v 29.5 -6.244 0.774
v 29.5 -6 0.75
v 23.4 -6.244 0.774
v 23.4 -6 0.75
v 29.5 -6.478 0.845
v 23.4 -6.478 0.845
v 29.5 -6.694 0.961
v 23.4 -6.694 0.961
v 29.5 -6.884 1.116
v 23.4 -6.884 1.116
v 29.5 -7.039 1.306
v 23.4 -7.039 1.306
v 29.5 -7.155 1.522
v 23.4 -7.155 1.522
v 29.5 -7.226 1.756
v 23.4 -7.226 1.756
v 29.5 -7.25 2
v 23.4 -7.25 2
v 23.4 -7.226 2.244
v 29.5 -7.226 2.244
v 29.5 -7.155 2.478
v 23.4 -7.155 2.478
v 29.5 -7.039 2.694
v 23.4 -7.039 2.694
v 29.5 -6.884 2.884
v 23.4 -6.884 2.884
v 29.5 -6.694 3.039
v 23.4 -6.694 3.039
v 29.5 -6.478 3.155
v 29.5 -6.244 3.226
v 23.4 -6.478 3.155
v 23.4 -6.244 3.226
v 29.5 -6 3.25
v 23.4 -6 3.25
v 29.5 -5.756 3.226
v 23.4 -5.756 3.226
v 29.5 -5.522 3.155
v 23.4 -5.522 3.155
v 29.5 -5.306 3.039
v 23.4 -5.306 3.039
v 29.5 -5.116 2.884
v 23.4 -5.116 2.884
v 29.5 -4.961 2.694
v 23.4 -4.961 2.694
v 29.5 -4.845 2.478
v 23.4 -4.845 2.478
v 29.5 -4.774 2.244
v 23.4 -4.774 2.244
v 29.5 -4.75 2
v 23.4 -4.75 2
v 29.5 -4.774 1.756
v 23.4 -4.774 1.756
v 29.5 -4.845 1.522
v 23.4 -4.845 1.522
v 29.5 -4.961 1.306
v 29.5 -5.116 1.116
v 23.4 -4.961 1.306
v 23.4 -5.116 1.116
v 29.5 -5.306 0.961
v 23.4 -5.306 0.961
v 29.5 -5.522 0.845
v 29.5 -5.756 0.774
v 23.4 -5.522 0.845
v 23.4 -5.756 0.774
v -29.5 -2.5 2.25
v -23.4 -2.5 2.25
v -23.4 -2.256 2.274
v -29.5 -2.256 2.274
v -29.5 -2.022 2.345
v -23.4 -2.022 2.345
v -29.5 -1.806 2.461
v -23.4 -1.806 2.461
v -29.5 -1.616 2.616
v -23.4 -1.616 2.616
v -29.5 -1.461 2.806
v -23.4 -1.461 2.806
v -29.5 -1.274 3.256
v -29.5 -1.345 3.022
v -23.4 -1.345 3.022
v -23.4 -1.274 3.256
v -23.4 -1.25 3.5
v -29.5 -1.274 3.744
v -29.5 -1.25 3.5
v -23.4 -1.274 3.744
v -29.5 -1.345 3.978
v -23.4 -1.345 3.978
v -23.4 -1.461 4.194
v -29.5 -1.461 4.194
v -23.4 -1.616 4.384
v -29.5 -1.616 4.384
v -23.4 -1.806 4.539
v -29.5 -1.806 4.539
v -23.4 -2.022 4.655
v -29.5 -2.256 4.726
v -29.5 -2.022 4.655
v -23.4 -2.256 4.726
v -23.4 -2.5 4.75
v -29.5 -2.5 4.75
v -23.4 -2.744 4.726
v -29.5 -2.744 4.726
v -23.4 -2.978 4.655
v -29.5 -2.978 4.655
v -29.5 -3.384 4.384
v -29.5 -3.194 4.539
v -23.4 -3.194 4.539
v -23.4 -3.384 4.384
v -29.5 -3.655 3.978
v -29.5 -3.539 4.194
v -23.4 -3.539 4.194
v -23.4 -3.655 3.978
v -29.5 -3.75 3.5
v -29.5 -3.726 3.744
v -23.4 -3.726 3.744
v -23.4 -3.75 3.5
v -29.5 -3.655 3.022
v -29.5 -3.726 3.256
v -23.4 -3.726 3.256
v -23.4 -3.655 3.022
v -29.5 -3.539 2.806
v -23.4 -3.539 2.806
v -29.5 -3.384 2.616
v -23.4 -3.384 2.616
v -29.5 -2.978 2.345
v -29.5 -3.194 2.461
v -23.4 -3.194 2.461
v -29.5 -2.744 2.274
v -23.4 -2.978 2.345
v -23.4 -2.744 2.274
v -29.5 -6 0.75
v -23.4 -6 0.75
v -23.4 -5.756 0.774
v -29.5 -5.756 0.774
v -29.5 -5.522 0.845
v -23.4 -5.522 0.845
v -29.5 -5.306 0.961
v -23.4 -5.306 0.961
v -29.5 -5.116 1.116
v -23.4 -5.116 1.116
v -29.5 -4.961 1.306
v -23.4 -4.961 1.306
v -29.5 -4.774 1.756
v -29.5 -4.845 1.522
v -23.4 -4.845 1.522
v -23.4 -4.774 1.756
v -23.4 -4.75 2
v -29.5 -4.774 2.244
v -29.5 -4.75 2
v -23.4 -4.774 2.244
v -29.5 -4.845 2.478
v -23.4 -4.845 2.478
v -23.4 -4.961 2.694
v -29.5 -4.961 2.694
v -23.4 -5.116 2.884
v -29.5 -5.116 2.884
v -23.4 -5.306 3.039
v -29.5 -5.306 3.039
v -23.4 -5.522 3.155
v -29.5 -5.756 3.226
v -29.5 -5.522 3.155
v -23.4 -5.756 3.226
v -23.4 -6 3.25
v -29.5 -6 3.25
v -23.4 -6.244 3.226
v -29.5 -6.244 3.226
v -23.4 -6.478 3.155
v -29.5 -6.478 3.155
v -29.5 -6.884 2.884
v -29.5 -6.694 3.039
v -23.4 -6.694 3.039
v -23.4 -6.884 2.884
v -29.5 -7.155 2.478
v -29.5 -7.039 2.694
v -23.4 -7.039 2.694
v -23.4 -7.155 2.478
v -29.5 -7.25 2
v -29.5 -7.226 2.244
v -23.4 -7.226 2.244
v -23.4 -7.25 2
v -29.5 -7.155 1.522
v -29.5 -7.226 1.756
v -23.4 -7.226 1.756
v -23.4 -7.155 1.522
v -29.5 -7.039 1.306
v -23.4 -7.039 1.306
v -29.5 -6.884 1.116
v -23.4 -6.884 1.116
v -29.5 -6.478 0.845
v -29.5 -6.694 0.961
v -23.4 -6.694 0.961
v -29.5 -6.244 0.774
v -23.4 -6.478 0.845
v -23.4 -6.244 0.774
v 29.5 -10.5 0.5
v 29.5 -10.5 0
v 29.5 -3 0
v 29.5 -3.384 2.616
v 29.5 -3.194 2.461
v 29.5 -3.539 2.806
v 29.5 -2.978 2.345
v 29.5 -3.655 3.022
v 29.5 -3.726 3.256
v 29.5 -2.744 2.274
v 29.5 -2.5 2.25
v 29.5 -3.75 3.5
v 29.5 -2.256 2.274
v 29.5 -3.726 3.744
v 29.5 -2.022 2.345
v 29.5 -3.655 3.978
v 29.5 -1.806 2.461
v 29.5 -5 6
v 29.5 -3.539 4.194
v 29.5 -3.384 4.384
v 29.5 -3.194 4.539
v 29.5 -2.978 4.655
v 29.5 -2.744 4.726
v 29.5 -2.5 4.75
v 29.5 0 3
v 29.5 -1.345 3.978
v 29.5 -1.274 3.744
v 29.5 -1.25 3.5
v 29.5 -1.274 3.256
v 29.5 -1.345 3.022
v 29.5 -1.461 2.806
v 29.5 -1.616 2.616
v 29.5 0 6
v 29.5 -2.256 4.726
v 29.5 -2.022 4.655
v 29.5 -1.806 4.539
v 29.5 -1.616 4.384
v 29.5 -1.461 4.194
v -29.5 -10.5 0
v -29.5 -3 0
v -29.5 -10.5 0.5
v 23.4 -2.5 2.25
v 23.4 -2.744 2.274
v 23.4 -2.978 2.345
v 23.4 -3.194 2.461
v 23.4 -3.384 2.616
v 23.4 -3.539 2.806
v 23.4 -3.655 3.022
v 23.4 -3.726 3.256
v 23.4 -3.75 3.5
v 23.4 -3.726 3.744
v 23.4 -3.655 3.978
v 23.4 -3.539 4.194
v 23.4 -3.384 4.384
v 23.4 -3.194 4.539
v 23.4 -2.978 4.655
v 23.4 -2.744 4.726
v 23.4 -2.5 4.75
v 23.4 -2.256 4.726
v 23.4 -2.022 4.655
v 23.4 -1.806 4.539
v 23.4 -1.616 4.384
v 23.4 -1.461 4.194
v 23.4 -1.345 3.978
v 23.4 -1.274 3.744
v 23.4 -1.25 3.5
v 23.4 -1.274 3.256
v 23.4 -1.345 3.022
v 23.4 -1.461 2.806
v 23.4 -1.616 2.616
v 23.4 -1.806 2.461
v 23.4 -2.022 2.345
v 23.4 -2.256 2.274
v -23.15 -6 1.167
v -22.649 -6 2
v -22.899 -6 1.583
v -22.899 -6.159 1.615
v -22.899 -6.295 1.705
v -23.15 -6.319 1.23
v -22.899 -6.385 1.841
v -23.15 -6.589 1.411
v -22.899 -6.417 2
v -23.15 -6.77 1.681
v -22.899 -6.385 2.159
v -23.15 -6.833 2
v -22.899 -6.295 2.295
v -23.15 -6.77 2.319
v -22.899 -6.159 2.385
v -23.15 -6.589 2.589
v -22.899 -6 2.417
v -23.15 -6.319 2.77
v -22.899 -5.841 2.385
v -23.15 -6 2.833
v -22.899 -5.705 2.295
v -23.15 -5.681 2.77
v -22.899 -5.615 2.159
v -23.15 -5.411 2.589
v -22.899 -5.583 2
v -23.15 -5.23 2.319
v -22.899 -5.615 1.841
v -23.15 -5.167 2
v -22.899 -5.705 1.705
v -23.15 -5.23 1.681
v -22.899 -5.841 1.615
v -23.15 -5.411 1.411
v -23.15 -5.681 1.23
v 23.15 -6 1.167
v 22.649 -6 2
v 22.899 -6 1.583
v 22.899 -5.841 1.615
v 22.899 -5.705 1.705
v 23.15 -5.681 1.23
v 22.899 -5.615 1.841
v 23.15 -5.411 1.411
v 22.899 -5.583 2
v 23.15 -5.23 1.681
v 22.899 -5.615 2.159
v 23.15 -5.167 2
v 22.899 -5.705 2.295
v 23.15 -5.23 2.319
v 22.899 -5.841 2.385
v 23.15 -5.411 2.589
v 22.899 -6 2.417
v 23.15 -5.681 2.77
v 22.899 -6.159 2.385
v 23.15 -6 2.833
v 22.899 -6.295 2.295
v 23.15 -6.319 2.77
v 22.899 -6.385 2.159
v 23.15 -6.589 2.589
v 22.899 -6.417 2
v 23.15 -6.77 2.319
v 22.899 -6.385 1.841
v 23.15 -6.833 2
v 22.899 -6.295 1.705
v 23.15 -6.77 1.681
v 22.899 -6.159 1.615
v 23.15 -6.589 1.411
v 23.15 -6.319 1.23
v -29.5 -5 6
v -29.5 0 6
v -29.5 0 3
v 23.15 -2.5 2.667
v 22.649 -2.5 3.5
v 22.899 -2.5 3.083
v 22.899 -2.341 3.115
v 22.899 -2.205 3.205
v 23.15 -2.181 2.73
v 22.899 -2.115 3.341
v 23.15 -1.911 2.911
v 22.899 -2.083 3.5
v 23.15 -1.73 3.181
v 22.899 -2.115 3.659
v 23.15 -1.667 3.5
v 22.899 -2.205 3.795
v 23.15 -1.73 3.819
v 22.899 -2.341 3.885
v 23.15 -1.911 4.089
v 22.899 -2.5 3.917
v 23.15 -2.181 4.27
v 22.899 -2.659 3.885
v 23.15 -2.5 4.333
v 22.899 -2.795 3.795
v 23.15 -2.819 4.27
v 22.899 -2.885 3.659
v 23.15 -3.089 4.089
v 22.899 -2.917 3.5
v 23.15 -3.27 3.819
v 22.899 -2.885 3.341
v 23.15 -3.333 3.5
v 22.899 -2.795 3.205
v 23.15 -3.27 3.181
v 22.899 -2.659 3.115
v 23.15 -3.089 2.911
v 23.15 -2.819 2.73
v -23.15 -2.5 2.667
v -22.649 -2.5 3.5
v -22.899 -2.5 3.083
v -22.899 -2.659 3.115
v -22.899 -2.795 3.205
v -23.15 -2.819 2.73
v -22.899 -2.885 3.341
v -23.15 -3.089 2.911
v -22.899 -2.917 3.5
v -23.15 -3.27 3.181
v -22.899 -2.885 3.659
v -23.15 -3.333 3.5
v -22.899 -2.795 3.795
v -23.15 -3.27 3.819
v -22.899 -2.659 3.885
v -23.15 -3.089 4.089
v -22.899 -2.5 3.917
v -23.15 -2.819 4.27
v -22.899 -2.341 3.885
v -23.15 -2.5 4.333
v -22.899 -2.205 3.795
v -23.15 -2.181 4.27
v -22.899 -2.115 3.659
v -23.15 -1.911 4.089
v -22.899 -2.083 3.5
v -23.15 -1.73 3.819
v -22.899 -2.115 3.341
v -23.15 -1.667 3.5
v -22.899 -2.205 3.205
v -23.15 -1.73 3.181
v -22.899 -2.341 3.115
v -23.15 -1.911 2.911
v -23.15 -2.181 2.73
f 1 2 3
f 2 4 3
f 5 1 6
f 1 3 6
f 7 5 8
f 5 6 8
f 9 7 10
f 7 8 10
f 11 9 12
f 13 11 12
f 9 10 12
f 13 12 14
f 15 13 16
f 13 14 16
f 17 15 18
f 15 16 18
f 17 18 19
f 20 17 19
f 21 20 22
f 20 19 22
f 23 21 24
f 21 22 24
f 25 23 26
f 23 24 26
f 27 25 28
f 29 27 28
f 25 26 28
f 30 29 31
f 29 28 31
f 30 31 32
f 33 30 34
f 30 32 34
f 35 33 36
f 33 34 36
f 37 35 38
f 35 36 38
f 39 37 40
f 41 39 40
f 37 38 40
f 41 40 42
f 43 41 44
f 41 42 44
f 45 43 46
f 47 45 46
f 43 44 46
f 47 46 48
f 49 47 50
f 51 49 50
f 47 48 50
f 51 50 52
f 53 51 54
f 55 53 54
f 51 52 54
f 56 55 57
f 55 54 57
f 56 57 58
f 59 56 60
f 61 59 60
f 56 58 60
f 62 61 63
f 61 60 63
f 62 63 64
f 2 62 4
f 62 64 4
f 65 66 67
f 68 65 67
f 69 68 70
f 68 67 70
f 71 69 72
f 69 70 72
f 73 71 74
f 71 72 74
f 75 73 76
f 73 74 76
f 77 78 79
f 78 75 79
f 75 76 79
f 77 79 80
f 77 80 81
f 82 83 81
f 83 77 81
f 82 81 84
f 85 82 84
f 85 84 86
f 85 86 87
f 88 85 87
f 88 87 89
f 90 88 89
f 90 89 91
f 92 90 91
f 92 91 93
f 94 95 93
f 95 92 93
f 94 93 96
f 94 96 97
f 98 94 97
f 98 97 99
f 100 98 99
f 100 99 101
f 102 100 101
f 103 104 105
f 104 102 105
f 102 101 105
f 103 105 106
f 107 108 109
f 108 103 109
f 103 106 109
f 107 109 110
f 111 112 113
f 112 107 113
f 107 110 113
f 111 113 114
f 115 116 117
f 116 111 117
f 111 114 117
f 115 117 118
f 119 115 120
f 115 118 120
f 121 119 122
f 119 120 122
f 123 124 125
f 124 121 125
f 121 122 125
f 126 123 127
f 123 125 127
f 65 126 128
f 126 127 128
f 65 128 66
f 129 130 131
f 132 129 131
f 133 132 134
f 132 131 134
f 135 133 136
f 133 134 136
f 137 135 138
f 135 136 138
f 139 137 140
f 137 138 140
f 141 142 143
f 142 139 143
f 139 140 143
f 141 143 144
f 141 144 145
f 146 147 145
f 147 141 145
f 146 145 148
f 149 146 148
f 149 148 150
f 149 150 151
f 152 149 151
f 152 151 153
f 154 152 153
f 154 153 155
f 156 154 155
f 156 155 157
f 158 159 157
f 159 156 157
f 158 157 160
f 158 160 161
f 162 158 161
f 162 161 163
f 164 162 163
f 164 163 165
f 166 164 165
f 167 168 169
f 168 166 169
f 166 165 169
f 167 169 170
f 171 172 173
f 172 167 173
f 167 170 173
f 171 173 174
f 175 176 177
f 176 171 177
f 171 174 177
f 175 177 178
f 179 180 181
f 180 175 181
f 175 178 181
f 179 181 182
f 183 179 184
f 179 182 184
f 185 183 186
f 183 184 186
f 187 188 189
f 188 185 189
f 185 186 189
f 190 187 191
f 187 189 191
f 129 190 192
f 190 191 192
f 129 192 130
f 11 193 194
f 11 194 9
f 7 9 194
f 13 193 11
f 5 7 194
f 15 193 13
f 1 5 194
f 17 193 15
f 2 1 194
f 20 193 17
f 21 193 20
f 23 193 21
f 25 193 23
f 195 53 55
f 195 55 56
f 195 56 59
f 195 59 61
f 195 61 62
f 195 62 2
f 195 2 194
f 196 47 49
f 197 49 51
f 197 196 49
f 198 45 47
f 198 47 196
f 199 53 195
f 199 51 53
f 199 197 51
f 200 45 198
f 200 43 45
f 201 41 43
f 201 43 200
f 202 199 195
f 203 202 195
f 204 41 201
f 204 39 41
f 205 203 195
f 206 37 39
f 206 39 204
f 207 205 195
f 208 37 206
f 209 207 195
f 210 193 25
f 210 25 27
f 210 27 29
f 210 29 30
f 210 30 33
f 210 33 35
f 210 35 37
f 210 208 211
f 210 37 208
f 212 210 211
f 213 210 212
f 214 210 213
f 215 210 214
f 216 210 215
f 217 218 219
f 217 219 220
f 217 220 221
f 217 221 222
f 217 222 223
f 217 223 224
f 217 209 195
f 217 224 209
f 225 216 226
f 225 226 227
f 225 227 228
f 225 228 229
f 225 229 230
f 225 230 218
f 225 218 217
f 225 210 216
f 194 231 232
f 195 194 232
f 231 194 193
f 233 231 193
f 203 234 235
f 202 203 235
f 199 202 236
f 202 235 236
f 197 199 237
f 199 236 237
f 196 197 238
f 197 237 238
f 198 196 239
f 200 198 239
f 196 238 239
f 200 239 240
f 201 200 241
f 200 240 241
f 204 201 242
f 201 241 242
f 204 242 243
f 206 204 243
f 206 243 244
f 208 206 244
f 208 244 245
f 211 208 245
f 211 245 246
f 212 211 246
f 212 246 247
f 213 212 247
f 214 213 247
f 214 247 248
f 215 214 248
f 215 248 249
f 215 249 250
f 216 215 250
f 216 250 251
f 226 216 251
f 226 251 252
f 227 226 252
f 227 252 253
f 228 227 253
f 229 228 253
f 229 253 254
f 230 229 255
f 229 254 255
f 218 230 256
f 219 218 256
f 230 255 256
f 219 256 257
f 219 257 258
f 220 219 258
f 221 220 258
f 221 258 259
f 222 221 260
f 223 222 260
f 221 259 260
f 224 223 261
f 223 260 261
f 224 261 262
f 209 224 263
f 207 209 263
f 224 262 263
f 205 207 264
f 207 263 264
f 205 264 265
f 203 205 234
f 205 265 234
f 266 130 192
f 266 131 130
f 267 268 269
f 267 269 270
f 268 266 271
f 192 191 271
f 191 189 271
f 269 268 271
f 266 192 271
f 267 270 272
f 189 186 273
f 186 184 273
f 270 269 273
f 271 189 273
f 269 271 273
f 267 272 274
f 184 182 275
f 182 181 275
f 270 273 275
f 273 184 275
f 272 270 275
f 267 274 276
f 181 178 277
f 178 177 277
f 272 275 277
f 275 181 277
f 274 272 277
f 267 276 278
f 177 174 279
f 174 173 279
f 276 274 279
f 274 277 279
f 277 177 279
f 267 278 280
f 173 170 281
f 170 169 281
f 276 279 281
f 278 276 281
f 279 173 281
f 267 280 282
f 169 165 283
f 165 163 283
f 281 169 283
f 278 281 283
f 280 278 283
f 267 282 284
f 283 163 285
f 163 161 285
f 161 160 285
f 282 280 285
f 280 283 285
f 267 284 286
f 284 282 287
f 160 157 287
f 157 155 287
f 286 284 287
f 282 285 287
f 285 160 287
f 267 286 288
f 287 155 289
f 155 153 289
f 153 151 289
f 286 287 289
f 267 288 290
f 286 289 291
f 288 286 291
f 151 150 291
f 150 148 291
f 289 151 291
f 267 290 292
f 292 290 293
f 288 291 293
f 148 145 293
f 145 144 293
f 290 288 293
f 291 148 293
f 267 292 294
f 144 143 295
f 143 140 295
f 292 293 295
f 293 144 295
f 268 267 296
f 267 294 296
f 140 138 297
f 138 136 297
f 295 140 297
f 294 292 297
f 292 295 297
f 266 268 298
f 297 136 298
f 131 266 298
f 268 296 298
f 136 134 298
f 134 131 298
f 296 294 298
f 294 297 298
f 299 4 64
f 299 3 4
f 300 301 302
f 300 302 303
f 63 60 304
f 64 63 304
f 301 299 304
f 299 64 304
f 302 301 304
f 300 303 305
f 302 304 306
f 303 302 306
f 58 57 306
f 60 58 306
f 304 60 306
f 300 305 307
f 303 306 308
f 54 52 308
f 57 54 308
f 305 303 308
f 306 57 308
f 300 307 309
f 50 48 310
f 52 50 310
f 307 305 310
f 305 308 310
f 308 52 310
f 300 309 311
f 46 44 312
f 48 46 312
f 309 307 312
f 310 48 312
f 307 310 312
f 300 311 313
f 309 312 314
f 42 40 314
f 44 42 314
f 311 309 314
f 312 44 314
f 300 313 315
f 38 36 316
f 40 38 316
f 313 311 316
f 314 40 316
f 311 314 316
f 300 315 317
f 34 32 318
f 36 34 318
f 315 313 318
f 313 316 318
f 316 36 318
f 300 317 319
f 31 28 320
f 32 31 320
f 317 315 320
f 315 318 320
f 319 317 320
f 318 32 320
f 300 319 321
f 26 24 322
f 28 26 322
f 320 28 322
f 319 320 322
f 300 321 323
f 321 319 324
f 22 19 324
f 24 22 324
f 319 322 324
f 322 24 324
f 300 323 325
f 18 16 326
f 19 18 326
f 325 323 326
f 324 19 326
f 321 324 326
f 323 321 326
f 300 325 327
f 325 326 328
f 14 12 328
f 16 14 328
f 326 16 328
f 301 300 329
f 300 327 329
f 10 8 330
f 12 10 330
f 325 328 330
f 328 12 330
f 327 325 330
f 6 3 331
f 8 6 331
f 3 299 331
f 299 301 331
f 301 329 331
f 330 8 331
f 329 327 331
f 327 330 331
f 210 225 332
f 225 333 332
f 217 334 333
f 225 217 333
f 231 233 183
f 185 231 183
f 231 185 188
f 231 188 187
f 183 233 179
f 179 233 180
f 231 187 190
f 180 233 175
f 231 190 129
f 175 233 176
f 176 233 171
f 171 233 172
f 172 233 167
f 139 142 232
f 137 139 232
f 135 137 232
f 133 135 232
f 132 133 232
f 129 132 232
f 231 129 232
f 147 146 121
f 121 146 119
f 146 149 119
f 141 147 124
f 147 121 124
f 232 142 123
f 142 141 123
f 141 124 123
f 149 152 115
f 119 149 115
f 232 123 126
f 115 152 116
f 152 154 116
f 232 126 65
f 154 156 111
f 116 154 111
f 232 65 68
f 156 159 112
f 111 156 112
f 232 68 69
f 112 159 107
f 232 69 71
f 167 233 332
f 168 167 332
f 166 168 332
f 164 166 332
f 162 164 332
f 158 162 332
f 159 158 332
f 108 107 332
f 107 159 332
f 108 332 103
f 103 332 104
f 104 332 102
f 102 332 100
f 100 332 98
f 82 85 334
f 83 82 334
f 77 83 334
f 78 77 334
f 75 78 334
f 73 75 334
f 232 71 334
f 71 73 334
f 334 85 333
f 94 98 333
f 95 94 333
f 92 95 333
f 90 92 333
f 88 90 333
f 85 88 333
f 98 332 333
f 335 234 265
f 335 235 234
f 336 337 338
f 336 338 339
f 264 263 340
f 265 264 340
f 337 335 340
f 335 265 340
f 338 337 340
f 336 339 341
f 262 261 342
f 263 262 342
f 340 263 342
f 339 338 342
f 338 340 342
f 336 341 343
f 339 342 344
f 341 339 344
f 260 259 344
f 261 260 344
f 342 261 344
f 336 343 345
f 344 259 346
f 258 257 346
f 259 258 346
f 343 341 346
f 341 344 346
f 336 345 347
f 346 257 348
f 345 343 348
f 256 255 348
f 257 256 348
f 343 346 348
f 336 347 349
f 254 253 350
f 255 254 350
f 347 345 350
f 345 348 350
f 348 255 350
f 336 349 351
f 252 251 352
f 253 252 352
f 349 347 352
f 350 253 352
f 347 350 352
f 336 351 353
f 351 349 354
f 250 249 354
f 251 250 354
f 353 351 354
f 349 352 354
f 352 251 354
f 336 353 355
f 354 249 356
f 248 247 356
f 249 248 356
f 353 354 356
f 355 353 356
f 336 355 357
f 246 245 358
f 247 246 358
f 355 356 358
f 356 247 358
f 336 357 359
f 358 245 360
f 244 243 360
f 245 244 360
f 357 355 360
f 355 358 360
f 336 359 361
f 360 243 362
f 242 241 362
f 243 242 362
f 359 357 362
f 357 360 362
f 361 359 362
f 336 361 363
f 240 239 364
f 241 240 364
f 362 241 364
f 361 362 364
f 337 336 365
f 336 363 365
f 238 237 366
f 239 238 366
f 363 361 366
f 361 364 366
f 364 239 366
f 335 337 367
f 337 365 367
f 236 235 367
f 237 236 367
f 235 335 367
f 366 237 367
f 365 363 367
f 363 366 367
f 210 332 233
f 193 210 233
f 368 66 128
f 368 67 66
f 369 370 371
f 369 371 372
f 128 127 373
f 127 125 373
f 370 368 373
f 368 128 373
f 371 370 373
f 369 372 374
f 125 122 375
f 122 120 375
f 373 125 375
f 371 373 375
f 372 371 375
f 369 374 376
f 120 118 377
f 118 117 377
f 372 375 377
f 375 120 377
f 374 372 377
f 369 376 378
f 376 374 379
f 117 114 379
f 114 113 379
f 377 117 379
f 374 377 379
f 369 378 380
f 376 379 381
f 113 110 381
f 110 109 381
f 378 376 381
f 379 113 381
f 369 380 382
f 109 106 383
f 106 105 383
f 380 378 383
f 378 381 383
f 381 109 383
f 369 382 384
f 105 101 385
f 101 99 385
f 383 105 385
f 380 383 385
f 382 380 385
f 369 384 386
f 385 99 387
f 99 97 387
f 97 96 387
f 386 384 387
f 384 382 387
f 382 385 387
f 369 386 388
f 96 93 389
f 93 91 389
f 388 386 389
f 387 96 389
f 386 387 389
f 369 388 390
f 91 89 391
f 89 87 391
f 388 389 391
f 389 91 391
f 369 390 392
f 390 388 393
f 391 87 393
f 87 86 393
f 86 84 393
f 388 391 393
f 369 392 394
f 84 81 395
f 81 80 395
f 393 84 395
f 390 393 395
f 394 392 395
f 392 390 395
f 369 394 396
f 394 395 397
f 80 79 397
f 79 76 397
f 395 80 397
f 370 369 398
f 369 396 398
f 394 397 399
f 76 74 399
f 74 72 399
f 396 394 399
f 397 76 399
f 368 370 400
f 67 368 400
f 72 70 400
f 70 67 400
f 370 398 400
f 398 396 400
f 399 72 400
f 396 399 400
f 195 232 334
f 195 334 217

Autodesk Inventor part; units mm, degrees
ref_plane "YZ Plane" through (0, 0, 0) normal (1, 0, 0) x (0, 1, 0)
ref_plane "XZ Plane" through (0, 0, 0) normal (0, 1, 0) x (-1, 0, 0)
ref_plane "XY Plane" through (0, 0, 0) normal (0, 0, 1) x (1, 0, 0)
sketch "Skizze1" plane through (0, 0, 0) normal (1, 0, 0) x (0, 1, 0)
  line L0 (-5, 6) -> (-10.5, 0.5)
  line L1 (-10.5, 0) -> (0, 0)
  line L2 (0, 0) -> (0, 6)
  line L3 (0, 6) -> (-5, 6)
  line L4 (-10.5, 0) -> (-10.5, 0.5)
  dimension "d35" = 45
  dimension "d54" = 6
  dimension "d55" = 0.5
  dimension "d56" = 10.5
extrude "Extrusion1" add sketch "Skizze1" along normal mid plane 59
fillet "Rundung2" [suppressed]
sketch "Skizze5" plane through (29.5, 0, 0) normal (1, 0, 0) x (0, 0, -1)
  line L0 (-7.2, 0) -> (1.2, 0) projected
  line L1 (0, -12.6) -> (0, 2.1) projected
  point P0 (0, 0)
  point P1 (-3.7, -4)
  dimension "d36" = 3.7
  dimension "d37" = 4
hole "Bohrung3" [suppressed]
sketch "Skizze6" plane through (29.5, 0, 0) normal (1, 0, 0) x (0, 0, -1)
  line L0 (-7.2, 0) -> (1.2, 0) projected
  line L1 (0, -12.6) -> (0, 2.1) projected
  point P0 (0, 0)
  point P1 (-3.5, -2.5)
  point P2 (-2, -6)
  dimension "d45" = 3.5
  dimension "d46" = 2.5
  dimension "d65" = 1.5
  dimension "d66" = 3.5
hole "Bohrung4" at (29.5, -2.5, 3.5) at (29.5, -6, 2) direction (-1, 0, 0) diameter 2.5 depth 6.1 tip angle 118
mirror "Spiegeln1" about plane through (0, 0, 0) normal (1, 0, 0) of "Bohrung4"
sketch "Skizze7" plane through (-29.5, -5, 6) normal (0, 0, 1) x (1, 0, 0)
  line L0 (0, 0) -> (59, 0) projected
  line L1 (59, 5) -> (59, 0) projected
  line L2 (59, 5) -> (0, 5) projected
  line L3 (0, 0) -> (0, 5) projected
  line L4 (0, 0) -> (0, 5) construction
  line L5 (0, 2.5) -> (59, 2.5) construction
  line L6 (29.5, 5) -> (29.5, 0) construction
  line L7 (0, 0) -> (59, 0) construction
  point P0 (15.5, 2.5)
  point P1 (43.5, 2.5)
  point P2 (29.5, 2.5)
  dimension "d57" = 14
hole "Bohrung5" [suppressed]
chamfer "Fase2" distance 3 angle 45 1 edges at (0, 0, 0)
properties part number "Chip Schaufel Mitte" material "Aluminium 6061"
